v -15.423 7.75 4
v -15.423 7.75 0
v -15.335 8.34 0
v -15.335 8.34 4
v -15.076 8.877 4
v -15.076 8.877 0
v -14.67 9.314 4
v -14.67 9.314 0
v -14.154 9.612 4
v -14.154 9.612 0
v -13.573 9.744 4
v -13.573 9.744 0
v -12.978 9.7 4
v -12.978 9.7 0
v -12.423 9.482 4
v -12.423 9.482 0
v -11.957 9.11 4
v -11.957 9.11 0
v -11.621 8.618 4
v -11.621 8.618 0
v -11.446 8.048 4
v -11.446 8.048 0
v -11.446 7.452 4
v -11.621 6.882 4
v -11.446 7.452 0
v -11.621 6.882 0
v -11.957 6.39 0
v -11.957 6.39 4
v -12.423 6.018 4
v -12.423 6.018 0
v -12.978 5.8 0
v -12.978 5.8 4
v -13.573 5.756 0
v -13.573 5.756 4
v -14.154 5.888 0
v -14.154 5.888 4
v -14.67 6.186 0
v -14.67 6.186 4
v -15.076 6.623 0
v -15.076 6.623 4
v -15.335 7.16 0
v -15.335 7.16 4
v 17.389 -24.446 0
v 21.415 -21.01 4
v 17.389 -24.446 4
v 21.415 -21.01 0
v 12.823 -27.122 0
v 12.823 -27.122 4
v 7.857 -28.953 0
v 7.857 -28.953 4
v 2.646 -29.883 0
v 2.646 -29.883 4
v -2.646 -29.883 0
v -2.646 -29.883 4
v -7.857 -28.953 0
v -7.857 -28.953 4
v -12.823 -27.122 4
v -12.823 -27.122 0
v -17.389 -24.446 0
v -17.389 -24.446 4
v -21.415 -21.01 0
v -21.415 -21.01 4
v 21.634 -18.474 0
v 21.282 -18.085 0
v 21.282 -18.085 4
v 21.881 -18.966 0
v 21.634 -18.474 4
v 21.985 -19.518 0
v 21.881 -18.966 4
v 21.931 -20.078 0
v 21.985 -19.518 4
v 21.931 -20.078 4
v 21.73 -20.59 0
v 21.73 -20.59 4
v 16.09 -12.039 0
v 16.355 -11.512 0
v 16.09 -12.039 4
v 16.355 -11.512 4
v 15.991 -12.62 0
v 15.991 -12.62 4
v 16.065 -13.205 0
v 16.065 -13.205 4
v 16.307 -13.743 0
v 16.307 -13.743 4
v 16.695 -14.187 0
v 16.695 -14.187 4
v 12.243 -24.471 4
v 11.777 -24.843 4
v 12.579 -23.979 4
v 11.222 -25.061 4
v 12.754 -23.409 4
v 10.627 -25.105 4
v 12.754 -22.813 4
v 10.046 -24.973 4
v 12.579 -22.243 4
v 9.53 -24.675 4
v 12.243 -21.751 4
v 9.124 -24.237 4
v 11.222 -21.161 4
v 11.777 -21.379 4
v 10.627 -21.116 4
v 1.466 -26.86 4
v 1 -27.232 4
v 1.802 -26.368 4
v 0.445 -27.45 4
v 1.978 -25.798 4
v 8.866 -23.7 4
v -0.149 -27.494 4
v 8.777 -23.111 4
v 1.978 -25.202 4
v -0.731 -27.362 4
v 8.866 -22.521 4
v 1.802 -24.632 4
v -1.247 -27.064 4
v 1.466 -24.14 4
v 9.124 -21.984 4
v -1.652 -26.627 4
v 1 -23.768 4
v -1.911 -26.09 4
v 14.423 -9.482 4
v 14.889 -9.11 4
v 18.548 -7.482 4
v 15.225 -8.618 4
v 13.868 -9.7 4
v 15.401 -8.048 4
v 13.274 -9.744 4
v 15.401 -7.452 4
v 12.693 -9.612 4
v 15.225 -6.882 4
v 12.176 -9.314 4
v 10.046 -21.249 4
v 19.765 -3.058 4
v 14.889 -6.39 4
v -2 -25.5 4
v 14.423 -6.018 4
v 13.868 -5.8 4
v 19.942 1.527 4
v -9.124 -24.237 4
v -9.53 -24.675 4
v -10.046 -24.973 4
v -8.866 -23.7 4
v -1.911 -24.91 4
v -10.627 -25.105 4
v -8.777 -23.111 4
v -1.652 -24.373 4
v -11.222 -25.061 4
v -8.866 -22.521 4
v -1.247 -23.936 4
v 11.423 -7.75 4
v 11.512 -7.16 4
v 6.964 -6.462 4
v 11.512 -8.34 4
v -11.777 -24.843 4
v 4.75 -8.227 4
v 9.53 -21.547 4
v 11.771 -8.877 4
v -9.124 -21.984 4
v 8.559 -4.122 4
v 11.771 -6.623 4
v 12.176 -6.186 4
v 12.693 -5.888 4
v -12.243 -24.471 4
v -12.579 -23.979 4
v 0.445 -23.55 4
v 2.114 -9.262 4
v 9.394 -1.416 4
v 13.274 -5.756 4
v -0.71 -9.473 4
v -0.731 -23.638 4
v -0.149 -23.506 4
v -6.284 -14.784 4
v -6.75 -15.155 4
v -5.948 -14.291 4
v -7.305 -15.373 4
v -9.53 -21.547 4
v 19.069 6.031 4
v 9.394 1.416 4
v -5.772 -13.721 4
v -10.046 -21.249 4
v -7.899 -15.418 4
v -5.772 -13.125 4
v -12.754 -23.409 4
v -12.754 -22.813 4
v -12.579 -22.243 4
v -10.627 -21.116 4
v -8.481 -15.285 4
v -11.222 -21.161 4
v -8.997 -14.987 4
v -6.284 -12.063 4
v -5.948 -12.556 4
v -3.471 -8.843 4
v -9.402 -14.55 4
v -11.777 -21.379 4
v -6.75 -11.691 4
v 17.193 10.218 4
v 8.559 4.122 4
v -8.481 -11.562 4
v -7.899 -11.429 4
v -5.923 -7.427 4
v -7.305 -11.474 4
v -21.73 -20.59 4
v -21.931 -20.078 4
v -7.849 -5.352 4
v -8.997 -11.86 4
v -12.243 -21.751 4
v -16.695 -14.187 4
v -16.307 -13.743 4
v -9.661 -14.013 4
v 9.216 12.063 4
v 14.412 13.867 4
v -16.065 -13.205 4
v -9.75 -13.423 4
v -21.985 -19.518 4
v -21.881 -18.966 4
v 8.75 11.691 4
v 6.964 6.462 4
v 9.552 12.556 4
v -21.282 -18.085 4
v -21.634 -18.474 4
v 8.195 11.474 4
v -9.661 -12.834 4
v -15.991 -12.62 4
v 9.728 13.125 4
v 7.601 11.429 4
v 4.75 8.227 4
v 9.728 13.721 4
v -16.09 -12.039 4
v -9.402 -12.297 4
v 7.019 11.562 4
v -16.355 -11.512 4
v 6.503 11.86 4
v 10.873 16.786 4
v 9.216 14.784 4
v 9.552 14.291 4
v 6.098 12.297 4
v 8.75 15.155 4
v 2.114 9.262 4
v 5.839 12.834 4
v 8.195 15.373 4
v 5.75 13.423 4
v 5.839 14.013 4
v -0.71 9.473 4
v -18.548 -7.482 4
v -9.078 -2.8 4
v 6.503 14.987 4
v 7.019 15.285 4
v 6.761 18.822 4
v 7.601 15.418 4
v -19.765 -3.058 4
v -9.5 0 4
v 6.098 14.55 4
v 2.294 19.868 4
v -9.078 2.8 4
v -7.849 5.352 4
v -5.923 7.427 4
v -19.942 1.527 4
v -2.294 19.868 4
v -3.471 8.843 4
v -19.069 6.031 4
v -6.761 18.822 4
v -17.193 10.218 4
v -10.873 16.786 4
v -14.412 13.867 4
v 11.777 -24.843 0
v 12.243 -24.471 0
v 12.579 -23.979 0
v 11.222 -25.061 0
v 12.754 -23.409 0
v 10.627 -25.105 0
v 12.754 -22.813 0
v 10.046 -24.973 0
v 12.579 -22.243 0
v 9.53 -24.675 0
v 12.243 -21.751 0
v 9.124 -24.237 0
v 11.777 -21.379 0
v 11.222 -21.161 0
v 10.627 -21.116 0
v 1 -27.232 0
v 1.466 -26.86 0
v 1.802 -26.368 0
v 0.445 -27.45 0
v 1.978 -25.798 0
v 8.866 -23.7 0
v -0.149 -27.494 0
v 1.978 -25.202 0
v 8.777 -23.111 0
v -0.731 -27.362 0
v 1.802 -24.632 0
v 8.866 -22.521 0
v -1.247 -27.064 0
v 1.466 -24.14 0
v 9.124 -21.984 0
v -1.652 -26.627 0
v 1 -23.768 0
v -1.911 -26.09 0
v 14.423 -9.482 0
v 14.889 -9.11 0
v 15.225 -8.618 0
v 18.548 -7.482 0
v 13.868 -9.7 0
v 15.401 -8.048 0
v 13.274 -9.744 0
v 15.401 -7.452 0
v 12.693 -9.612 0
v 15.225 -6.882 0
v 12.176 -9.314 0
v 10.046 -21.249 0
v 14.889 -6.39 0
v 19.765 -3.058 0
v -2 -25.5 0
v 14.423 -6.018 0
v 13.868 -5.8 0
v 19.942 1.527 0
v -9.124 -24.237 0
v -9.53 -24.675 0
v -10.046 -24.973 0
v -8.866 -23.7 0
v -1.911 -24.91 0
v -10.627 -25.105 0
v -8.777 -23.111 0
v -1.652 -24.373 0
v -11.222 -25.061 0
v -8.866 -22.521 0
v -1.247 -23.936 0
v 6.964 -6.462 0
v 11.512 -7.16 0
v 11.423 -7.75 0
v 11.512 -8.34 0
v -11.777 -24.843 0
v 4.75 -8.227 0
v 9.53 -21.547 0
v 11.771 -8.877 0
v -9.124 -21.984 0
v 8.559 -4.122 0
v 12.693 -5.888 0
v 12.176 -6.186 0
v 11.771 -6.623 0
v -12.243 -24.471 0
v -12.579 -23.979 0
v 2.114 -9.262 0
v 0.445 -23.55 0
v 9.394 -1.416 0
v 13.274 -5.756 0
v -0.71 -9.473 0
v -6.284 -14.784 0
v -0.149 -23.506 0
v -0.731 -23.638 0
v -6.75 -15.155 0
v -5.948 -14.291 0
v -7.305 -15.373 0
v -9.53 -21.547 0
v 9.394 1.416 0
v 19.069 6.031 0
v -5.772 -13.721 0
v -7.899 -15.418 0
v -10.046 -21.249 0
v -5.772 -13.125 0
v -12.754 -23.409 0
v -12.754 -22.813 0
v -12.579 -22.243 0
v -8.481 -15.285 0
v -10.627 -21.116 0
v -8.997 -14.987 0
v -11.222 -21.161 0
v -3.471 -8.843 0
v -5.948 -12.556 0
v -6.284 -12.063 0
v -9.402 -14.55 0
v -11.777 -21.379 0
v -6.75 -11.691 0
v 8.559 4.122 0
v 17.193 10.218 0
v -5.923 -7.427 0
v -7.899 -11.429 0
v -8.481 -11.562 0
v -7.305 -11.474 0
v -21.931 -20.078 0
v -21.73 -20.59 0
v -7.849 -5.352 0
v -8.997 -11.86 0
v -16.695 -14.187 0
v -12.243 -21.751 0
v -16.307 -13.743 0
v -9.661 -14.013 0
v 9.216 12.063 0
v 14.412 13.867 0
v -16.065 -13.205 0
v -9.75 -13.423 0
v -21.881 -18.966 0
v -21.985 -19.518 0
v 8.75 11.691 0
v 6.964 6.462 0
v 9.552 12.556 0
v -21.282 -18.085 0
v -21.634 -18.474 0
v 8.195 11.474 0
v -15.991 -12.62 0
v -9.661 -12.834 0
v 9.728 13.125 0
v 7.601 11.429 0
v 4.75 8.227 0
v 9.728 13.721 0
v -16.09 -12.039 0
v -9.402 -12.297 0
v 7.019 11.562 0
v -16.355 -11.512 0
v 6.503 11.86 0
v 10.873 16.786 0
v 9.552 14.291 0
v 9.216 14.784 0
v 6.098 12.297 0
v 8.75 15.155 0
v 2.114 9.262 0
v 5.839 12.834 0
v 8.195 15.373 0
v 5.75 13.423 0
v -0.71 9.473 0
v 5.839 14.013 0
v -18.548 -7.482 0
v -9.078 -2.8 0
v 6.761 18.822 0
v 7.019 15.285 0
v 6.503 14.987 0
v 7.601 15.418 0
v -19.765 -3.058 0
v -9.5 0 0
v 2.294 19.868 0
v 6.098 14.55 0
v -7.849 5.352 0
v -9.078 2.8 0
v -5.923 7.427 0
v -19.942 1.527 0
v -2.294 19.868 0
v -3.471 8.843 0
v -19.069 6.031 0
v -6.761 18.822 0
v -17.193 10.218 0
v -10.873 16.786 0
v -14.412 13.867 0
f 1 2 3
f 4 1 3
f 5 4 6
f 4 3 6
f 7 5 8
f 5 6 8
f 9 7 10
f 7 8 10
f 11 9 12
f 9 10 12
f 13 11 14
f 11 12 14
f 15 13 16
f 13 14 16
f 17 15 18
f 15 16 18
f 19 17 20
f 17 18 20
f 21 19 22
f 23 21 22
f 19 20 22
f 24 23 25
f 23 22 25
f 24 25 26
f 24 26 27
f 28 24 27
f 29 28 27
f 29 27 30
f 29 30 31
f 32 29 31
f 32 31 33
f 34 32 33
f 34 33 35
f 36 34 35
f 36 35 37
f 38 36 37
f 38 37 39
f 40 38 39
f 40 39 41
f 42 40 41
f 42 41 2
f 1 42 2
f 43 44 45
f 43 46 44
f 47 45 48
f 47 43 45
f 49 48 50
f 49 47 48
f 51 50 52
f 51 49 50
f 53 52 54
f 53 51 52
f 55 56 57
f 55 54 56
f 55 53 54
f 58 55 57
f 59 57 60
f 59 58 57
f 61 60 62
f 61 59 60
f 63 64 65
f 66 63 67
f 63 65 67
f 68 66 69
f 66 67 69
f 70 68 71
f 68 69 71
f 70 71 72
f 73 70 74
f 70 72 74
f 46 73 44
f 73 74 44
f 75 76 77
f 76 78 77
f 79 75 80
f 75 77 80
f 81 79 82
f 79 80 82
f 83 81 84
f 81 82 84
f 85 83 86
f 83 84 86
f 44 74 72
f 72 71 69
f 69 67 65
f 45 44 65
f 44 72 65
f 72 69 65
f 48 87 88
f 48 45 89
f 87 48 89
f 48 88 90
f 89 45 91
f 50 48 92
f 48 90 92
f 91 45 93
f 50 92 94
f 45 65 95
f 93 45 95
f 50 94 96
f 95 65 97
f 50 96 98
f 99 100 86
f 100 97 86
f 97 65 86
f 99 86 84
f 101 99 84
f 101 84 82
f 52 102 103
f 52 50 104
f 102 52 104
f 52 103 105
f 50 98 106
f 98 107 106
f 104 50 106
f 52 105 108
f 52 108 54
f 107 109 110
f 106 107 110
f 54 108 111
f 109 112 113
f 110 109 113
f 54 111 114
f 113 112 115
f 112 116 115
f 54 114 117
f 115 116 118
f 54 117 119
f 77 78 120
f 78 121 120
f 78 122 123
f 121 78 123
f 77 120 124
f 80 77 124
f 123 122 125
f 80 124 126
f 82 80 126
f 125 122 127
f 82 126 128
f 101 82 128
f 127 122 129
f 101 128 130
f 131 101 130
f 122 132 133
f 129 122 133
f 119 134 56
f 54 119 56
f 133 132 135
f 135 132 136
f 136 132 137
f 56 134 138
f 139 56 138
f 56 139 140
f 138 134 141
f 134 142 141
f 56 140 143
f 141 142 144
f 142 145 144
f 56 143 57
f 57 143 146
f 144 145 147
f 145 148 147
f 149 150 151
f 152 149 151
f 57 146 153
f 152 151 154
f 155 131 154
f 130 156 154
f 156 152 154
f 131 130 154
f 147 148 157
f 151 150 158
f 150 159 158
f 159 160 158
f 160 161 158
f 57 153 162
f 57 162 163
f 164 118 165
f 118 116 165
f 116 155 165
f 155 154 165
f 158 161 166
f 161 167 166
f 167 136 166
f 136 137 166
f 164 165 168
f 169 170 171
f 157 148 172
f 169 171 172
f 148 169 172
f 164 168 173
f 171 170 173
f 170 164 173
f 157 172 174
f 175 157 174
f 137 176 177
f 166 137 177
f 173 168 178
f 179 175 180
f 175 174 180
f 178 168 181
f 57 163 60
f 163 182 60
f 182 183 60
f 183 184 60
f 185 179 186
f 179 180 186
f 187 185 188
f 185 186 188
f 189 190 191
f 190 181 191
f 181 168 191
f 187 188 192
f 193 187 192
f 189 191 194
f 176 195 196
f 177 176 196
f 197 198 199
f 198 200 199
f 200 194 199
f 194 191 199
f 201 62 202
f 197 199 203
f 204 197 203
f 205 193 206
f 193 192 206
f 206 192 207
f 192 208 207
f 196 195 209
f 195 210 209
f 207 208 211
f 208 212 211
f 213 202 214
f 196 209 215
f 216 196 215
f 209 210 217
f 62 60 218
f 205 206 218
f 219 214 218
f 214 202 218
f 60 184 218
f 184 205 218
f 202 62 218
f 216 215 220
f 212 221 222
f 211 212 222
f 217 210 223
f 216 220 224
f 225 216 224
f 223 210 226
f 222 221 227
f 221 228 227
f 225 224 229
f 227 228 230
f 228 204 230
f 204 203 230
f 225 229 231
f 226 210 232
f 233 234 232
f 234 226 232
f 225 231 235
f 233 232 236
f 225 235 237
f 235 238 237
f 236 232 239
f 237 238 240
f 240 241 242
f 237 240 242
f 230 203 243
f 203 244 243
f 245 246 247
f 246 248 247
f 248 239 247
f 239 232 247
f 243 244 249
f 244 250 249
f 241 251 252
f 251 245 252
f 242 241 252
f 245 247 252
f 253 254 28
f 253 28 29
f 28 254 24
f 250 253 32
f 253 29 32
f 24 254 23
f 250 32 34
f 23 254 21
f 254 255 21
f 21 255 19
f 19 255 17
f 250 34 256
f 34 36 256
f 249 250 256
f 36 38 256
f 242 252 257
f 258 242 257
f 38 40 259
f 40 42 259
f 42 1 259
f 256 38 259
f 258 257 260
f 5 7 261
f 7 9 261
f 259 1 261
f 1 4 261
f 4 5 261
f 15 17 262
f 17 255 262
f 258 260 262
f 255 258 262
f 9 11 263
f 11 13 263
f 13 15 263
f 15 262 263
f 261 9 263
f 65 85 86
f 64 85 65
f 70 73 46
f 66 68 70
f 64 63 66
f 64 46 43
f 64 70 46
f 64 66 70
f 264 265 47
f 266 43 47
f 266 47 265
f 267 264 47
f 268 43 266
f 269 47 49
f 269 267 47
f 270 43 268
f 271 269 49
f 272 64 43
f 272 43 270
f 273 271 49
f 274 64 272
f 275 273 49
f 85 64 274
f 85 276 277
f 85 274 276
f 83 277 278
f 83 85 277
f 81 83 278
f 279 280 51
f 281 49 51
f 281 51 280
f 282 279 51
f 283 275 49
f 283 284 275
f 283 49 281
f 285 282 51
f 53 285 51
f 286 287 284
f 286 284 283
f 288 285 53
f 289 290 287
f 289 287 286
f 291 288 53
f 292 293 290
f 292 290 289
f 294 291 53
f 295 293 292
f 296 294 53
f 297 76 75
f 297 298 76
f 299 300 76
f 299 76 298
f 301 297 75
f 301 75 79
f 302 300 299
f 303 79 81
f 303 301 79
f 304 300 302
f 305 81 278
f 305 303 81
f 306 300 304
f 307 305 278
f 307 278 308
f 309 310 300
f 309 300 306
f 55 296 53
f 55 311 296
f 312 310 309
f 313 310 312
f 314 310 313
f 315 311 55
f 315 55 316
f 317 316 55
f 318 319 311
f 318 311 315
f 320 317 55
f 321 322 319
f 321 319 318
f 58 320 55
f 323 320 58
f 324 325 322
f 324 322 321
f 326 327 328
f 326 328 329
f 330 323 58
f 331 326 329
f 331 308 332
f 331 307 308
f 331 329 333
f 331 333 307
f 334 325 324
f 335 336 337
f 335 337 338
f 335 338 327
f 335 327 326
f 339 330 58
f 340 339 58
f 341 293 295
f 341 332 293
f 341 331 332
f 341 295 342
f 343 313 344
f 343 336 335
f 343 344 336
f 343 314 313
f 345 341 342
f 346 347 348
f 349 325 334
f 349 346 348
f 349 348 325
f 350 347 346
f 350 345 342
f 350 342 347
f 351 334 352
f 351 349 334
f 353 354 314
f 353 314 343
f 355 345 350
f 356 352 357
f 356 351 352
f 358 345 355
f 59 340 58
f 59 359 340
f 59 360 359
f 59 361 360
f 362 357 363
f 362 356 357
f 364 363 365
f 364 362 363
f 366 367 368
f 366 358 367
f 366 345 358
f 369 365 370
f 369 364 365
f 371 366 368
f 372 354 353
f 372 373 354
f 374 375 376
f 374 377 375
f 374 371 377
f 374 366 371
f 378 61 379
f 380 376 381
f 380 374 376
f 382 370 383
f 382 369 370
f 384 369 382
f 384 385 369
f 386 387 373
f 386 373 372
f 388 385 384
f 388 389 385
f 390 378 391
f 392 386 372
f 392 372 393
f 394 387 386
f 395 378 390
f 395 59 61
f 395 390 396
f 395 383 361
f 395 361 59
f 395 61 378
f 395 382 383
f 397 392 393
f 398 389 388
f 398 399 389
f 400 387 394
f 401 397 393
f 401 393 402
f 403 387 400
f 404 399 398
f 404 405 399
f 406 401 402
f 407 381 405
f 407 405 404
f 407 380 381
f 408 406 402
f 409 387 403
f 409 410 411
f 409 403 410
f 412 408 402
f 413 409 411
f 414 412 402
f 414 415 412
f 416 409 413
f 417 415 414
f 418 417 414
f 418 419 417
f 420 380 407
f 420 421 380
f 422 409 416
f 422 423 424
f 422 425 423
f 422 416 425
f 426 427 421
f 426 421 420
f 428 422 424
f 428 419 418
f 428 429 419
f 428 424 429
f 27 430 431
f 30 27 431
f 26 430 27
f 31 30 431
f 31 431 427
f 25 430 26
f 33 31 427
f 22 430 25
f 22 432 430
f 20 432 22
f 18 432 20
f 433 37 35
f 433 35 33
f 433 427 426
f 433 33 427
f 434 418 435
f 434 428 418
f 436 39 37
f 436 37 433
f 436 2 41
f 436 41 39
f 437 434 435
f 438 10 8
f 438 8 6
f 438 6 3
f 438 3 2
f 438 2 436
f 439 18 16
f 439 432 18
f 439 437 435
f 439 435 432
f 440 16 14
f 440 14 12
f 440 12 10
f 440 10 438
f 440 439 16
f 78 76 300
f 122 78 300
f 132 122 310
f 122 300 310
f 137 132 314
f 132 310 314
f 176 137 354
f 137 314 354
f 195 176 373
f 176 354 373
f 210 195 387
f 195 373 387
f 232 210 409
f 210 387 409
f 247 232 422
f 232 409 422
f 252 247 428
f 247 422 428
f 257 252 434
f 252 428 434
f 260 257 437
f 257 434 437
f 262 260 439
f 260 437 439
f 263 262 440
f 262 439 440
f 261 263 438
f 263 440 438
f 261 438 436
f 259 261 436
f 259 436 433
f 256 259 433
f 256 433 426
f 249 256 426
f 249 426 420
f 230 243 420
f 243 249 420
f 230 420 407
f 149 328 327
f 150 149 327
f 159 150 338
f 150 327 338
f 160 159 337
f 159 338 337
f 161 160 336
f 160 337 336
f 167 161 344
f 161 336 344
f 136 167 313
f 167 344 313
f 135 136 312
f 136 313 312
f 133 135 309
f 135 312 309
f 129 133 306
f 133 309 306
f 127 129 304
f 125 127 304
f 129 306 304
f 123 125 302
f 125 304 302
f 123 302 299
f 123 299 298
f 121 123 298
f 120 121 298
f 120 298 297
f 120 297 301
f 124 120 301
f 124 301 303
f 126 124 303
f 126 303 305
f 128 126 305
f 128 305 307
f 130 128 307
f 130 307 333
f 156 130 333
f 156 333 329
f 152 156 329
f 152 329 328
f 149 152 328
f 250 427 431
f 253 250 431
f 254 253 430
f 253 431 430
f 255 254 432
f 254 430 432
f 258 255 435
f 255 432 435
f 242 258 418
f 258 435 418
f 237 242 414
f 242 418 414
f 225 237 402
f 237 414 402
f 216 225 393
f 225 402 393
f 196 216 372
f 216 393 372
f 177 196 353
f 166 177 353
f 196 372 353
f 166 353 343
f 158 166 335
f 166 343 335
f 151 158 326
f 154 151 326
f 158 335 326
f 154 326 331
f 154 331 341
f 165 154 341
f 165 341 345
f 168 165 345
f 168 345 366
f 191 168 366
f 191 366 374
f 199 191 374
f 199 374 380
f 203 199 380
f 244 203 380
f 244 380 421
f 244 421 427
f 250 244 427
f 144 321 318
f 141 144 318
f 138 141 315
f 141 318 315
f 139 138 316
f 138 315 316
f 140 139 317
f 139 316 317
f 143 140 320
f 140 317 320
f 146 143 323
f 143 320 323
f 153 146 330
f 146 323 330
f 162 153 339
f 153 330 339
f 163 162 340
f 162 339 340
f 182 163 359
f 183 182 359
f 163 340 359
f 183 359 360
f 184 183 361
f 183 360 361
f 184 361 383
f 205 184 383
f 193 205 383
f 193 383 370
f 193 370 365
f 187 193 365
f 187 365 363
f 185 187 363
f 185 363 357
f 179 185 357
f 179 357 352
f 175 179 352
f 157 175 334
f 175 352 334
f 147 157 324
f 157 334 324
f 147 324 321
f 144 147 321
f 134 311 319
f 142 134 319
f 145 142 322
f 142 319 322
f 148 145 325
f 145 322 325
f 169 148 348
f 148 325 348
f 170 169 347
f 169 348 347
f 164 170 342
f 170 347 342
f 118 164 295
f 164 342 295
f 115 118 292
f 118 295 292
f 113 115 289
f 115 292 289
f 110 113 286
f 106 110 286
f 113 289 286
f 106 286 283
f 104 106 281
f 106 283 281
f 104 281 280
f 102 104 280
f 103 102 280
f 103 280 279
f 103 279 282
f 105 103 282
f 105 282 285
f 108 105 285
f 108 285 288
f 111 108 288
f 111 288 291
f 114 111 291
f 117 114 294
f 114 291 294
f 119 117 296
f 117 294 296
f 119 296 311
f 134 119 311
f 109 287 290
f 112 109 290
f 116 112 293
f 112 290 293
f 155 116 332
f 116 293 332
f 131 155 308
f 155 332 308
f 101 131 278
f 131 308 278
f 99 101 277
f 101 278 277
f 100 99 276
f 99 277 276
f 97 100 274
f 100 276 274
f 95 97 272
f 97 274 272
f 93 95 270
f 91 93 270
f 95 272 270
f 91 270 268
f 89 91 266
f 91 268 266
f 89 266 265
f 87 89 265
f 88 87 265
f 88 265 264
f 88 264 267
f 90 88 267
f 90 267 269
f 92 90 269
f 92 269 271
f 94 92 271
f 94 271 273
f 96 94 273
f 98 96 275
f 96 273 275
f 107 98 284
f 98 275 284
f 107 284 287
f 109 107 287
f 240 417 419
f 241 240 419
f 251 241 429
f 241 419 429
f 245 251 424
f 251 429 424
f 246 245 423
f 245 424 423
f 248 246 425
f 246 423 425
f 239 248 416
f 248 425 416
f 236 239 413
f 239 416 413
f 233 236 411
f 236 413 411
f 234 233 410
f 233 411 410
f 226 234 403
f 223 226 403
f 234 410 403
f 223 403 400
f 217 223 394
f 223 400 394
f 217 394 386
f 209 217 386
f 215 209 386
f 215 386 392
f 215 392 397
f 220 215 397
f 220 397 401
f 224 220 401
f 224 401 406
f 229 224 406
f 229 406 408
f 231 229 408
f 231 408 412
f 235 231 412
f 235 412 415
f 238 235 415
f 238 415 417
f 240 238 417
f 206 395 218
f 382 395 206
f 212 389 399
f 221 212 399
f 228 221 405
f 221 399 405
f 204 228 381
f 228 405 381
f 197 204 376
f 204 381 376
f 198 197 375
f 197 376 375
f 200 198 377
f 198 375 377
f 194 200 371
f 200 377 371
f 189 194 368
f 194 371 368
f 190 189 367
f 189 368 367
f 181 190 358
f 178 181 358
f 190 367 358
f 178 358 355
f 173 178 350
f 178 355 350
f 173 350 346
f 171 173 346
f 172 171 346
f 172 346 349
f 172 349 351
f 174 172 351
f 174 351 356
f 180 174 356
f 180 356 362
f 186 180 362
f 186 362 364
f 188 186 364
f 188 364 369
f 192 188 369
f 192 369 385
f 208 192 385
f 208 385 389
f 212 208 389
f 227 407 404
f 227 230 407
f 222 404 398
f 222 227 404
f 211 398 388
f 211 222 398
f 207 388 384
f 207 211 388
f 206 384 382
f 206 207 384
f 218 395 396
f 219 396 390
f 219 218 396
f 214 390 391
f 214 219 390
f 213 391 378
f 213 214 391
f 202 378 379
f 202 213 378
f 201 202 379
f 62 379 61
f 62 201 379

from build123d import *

# Parameters (mm, degrees)
SKETCH_1_R           = 20
SKETCH_1_R_2         = 2
EXTRUDE_1_DEPTH      = 4
EXTRUDE_START        = -4
EXTRUDE_2_DEPTH      = 4
FILLET_2_R           = 5
FILLET_3_R           = 5
SKETCH_3_R           = 58.160089131
SKETCH_3_R_2         = 39.60449563
CUT_EXTRUDE_1_DEPTH  = 4
FILLET_4_R           = 8
EXTRUDE_3_DEPTH      = 4
SKETCH_5_R           = 2
CUT_EXTRUDE_2_DEPTH  = 4
SKETCH_6_R           = 2
CUT_EXTRUDE_3_DEPTH  = 10
EXTRUDE_4_DEPTH      = 4
EXTRUDE_6_DEPTH      = 4
CUT_EXTRUDE_6_DEPTH  = 4
FILLET_6_R           = 10
FILLET_7_R           = 10
FILLET_8_R           = 10
SKETCH_10_R          = 2
EXTRUDE_7_DEPTH      = 4
SKETCH_11_R          = 55.332509923
SKETCH_11_R_2        = 30
CUT_EXTRUDE_7_DEPTH  = 4
EXTRUDE_8_DEPTH      = 4
SKETCH_13_R          = 2
CUT_EXTRUDE_8_DEPTH  = 4
SKETCH_14_R          = 9.5
CUT_EXTRUDE_9_DEPTH  = 10
SKETCH_15_R          = 2
EXTRUDE_9_DEPTH      = 5
SKETCH_16_R          = 20
SKETCH_16_R_2        = 9.5
EXTRUDE_10_DEPTH     = 4
SKETCH_18_R          = 2
CUT_EXTRUDE_11_DEPTH = 39.776527497
FILLET_9_R           = 2
FILLET_10_R          = 2
CUT_EXTRUDE_START    = -5
SKETCH_19_R          = 2
CUT_EXTRUDE_12_DEPTH = 5


with BuildPart() as part:
    # 草图1 → 凸台-拉伸1 (new body)
    with BuildSketch(Plane.XY):
        Circle(SKETCH_1_R)
        with Locations((-15.5, 0)):
            Circle(SKETCH_1_R_2, mode=Mode.SUBTRACT)
        with Locations((15.5, 0)):
            Circle(SKETCH_1_R_2, mode=Mode.SUBTRACT)
        with Locations((-7.75, 13.423393759)):
            Circle(SKETCH_1_R_2, mode=Mode.SUBTRACT)
        with Locations((-7.75, -13.423393759)):
            Circle(SKETCH_1_R_2, mode=Mode.SUBTRACT)
        with Locations((7.75, -13.423393759)):
            Circle(SKETCH_1_R_2, mode=Mode.SUBTRACT)
        with Locations((7.75, 13.423393759)):
            Circle(SKETCH_1_R_2, mode=Mode.SUBTRACT)
    extrude(amount=EXTRUDE_1_DEPTH)

    # 草图2 → 凸台-拉伸2 (add)
    with BuildSketch(Plane.XY.offset(4).offset(EXTRUDE_START)):
        with BuildLine():
            add(Edge.make_bspline(
                [(-31.652235688, -31.652235688), (-33.388516019, -22.659494294), (-23.392443281, -20.962737075), (-16.1166561, -16.161254448), (-15.240575556, -12.950863166)],
                knots=[0, 0, 0, 0, 0.575012139, 0.86884139, 0.86884139, 0.86884139, 0.86884139], degree=3))
            ThreePointArc((-31.652235688, -31.652235688), (0, -44.76302099), (31.652235688, -31.652235688))
            add(Edge.make_bspline(
                [(31.652235688, -31.652235688), (33.388516019, -22.659494294), (23.392443281, -20.962737075), (16.1166561, -16.161254448), (15.240575556, -12.950863166)],
                knots=[0, 0, 0, 0, 0.575012139, 0.86884139, 0.86884139, 0.86884139, 0.86884139], degree=3))
            ThreePointArc((15.240575556, -12.950863166), (0, -20), (-15.240575556, -12.950863166))
        make_face()
    extrude(amount=EXTRUDE_2_DEPTH)

    # 圆角2
    fillet_2_edges = [part.edges().sort_by_distance(p)[0] for p in [
        (-31.652235688, -31.652235688, 2),
    ]]
    fillet(fillet_2_edges, radius=FILLET_2_R)

    # 圆角3
    fillet_3_edges = [part.edges().sort_by_distance(p)[0] for p in [
        (31.652235688, -31.652235688, 2),
    ]]
    fillet(fillet_3_edges, radius=FILLET_3_R)

    # 草图3 → 切除-拉伸1 (cut)
    with BuildSketch(Plane(origin=(0, 0, 0), x_dir=(-1, 0, 0), z_dir=(0, 0, -1))):
        Circle(SKETCH_3_R)
        Circle(SKETCH_3_R_2, mode=Mode.SUBTRACT)
    extrude(amount=-CUT_EXTRUDE_1_DEPTH, mode=Mode.SUBTRACT)

    # 圆角4
    fillet_4_edges = [part.edges().sort_by_distance(p)[0] for p in [
        (30.87581987, -24.803221997, 2),
        (-30.87581987, -24.803221997, 2),
    ]]
    fillet(fillet_4_edges, radius=FILLET_4_R)

    # 草图4 → 凸台-拉伸3 (add)
    with BuildSketch(Plane(origin=(0, 0, 0), x_dir=(-1, 0, 0), z_dir=(0, 0, -1))):
        with BuildLine():
            Line((-22.183787779, -32.808468935), (-22.405322857, -33.136105801))
            ThreePointArc((-22.405322857, -33.136105801), (0.038199329, -39.99998176), (22.468570811, -33.093251967))
            Line((22.468570811, -33.093251967), (22.183787779, -32.808468935))
            ThreePointArc((22.183787779, -32.808468935), (0, -39.60449563), (-22.183787779, -32.808468935))
        make_face()
    extrude(amount=-EXTRUDE_3_DEPTH)

    # 草图5 → 切除-拉伸2 (cut)
    with BuildSketch(Plane(origin=(0, 0, 0), x_dir=(-1, 0, 0), z_dir=(0, 0, -1))):
        with Locations((-15.848184815, -33.986542014)):
            Circle(SKETCH_5_R)
        with Locations((0, -37.5)):
            Circle(SKETCH_5_R)
        with Locations(Location((15.848184815, -33.986542014, 0), (0, 0, 180))):
            Circle(SKETCH_5_R)
    extrude(amount=-CUT_EXTRUDE_2_DEPTH, mode=Mode.SUBTRACT)

    # 草图6 → 切除-拉伸3 (cut)
    with BuildSketch(Plane(origin=(0, 0, 0), x_dir=(-1, 0, 0), z_dir=(0, 0, -1))):
        with Locations((0.038199329, -29.99998176)):
            Circle(SKETCH_6_R)
    extrude(amount=-CUT_EXTRUDE_3_DEPTH, mode=Mode.SUBTRACT)

    # 草图7 → 凸台-拉伸4 (add)
    with BuildSketch(Plane.XY.offset(4)):
        with BuildLine():
            Line((-22.468570811, -33.093251967), (-23.907156981, -34.531838137))
            ThreePointArc((-23.907156981, -34.531838137), (-0.231167262, -41.999363825), (23.525589, -34.792911091))
            Line((23.525589, -34.792911091), (22.405322857, -33.136105801))
            Line((22.405322857, -33.136105801), (22.183787779, -32.808468935))
            ThreePointArc((22.183787779, -32.808468935), (0, -39.60449563), (-22.183787779, -32.808468935))
            Line((-22.183787779, -32.808468935), (-22.468570811, -33.093251967))
        make_face()
    extrude(amount=-EXTRUDE_4_DEPTH)

    # 草图8 → 凸台-拉伸6 (add)
    with BuildSketch(Plane(origin=(0, 0, 0), x_dir=(-1, 0, 0), z_dir=(0, 0, -1))):
        with BuildLine():
            Line((-25.678439695, -25.558394246), (-20.516854663, -32.863070329))
            Line((-20.516854663, -32.863070329), (-23.525589, -34.792911091))
            add(Edge.make_bspline(
                [(-23.525589, -34.792911091), (-26.001835591, -30.056258517), (-25.678439695, -25.558394246)],
                knots=[0, 0, 0, 0.47951431, 0.47951431, 0.47951431], degree=2))
        make_face()
        with BuildLine():
            Line((20.516854663, -32.863070329), (23.525589, -34.792911091))
            add(Edge.make_bspline(
                [(23.525589, -34.792911091), (26.001835591, -30.056258517), (25.678439695, -25.558394246)],
                knots=[0, 0, 0, 0.47951431, 0.47951431, 0.47951431], degree=2))
            Line((25.678439695, -25.558394246), (20.516854663, -32.863070329))
        make_face()
    extrude(amount=-EXTRUDE_6_DEPTH)

    # 草图9 → 切除-拉伸6 (cut)
    with BuildSketch(Plane(origin=(0, 0, 0), x_dir=(-1, 0, 0), z_dir=(0, 0, -1))):
        Polygon((23.742659966, -34.367341122), (22.906265437, -35.20373565), (24.433492861, -34.374984505), align=None)
    extrude(amount=-CUT_EXTRUDE_6_DEPTH, mode=Mode.SUBTRACT)

    # 圆角6
    fillet_6_edges = [part.edges().sort_by_distance(p)[0] for p in [
        (23.525589, -34.792911091, 2),
    ]]
    fillet(fillet_6_edges, radius=FILLET_6_R)

    # 圆角7
    # the kernel refuses this fillet: 10 mm, written as the material it takes off along each edge
    with BuildSketch(Plane(origin=(-23.742659966, -34.367341122, 10.292446297), x_dir=(0.7071067812003878, -0.7071067811727072, 0), z_dir=(0, 0, -1))) as fillet_7_piece_1:
        with BuildLine():
            CenterArc((1.956172782, -9.970053017), FILLET_7_R, 94.435296014, 20.980736708)
            Line((-2.335706132, -0.937900705), (-2.42154371, -0.757257658))
            ThreePointArc((-2.42154371, -0.757257658), (-1.256201499, -0.248323162), (-0.06365122, 0.189600955))
            Line((-0.06365122, 0.189600955), (0, 0.2))
            ThreePointArc((0, 0.2), (0.591420243, 0.2), (1.16737384, 0.19940106))
            Line((1.16737384, 0.19940106), (1.182840486, 0))
        make_face()
    extrude(amount=16.584892581, mode=Mode.SUBTRACT)

    # 圆角8
    fillet_8_edges = [part.edges().sort_by_distance(p)[0] for p in [
        (-22.906265437, -35.20373565, 2),
    ]]
    fillet(fillet_8_edges, radius=FILLET_8_R)

    # 草图10 → 凸台-拉伸7 (add)
    with BuildSketch(Plane(origin=(0, 0, 0), x_dir=(-1, 0, 0), z_dir=(0, 0, -1))):
        with Locations((0.038199329, -29.99998176)):
            Circle(SKETCH_10_R)
        with Locations((0, -37.5)):
            Circle(SKETCH_10_R)
        with Locations((15.848184815, -33.986542014)):
            Circle(SKETCH_10_R)
        with Locations((-15.848184815, -33.986542014)):
            Circle(SKETCH_10_R)
    extrude(amount=-EXTRUDE_7_DEPTH)

    # 草图11 → 切除-拉伸7 (cut)
    with BuildSketch(Plane(origin=(0, 0, 0), x_dir=(-1, 0, 0), z_dir=(0, 0, -1))):
        Circle(SKETCH_11_R)
        Circle(SKETCH_11_R_2, mode=Mode.SUBTRACT)
    extrude(amount=-CUT_EXTRUDE_7_DEPTH, mode=Mode.SUBTRACT)

    # 草图12 → 凸台-拉伸8 (add)
    with BuildSketch(Plane(origin=(0, 0, 0), x_dir=(-1, 0, 0), z_dir=(0, 0, -1))):
        with BuildLine():
            Line((-15.240575556, -12.950863166), (-22.860863333, -19.426294749))
            ThreePointArc((-22.860863333, -19.426294749), (-19.109156974, -23.126610641), (-14.767877105, -26.1134028))
            Line((-14.767877105, -26.1134028), (-15.240575556, -12.950863166))
        make_face()
        with BuildLine():
            Line((15.240575556, -12.950863166), (14.767877105, -26.1134028))
            ThreePointArc((14.767877105, -26.1134028), (19.109156974, -23.126610641), (22.860863333, -19.426294749))
            Line((22.860863333, -19.426294749), (15.240575556, -12.950863166))
        make_face()
    extrude(amount=-EXTRUDE_8_DEPTH)

    # 草图13 → 切除-拉伸8 (cut)
    with BuildSketch(Plane(origin=(0, 0, 0), x_dir=(-1, 0, 0), z_dir=(0, 0, -1))):
        with Locations((-10.776765674, -23.110848569)):
            Circle(SKETCH_13_R)
        with Locations((0, -25.5)):
            Circle(SKETCH_13_R)
        with Locations(Location((10.776765674, -23.110848569, 0), (0, 0, 180))):
            Circle(SKETCH_13_R)
    extrude(amount=-CUT_EXTRUDE_8_DEPTH, mode=Mode.SUBTRACT)

    # 草图14 → 切除-拉伸9 (cut)
    with BuildSketch(Plane(origin=(0, 0, 0), x_dir=(-1, 0, 0), z_dir=(0, 0, -1))):
        Circle(SKETCH_14_R)
    extrude(amount=-CUT_EXTRUDE_9_DEPTH, mode=Mode.SUBTRACT)

    # 草图15 → 凸台-拉伸9 (add)
    with BuildSketch(Plane(origin=(0, 0, 0), x_dir=(-1, 0, 0), z_dir=(0, 0, -1))):
        with Locations(Location((0, 15.5, 0), (0, 0, 180))):
            Circle(SKETCH_15_R)
        with Locations(Location((0, -15.5, 0), (0, 0, 180))):
            Circle(SKETCH_15_R)
        with Locations(Location((-13.423393758, 7.75, 0), (0, 0, 180))):
            Circle(SKETCH_15_R)
        with Locations(Location((13.423393759, 7.75, 0), (0, 0, 180))):
            Circle(SKETCH_15_R)
        with Locations(Location((13.423393759, -7.75, 0), (0, 0, 180))):
            Circle(SKETCH_15_R)
        with Locations(Location((-13.423393758, -7.75, 0), (0, 0, 180))):
            Circle(SKETCH_15_R)
    extrude(amount=EXTRUDE_9_DEPTH)

    # 草图16 → 凸台-拉伸10 (add)
    with BuildSketch(Plane.XY.offset(4).offset(EXTRUDE_START)):
        Circle(SKETCH_16_R)
        with Locations(Location((0, 0, 0), (0, 0, 180))):
            Circle(SKETCH_16_R_2, mode=Mode.SUBTRACT)
    extrude(amount=EXTRUDE_10_DEPTH)

    # 草图18 → 切除-拉伸11 (cut, through all)
    with BuildSketch(Plane(origin=(0, 0, -5), x_dir=(-1, 0, 0), z_dir=(0, 0, -1))):
        with Locations((13.423393759, 7.75)):
            Circle(SKETCH_18_R)
        with Locations((7.75, -13.423393759)):
            Circle(SKETCH_18_R)
        with Locations((-13.423393759, -7.75)):
            Circle(SKETCH_18_R)
        with Locations((-7.75, 13.423393759)):
            Circle(SKETCH_18_R)
    extrude(amount=-CUT_EXTRUDE_11_DEPTH, mode=Mode.SUBTRACT)

    # 圆角9
    fillet_9_edges = [part.edges().sort_by_distance(p)[0] for p in [
        (-15.240575556, -12.950863166, 2),
        (15.240575556, -12.950863166, 2),
    ]]
    fillet(fillet_9_edges, radius=FILLET_9_R)

    # 圆角10
    fillet_10_edges = [part.edges().sort_by_distance(p)[0] for p in [
        (22.860863333, -19.426294749, 2),
        (-22.860863333, -19.426294749, 2),
    ]]
    fillet(fillet_10_edges, radius=FILLET_10_R)

    # 草图19 → 切除-拉伸12 (cut)
    with BuildSketch(Plane(origin=(0, 0, -5), x_dir=(-1, 0, 0), z_dir=(0, 0, -1)).offset(CUT_EXTRUDE_START)):
        with Locations((0, 15.5)):
            Circle(SKETCH_19_R)
        with Locations((0, -15.5)):
            Circle(SKETCH_19_R)
        with Locations((13.423393759, -7.75)):
            Circle(SKETCH_19_R)
        with Locations((-13.423393758, 7.75)):
            Circle(SKETCH_19_R)
    extrude(amount=CUT_EXTRUDE_12_DEPTH, mode=Mode.SUBTRACT)


solid = part.part
